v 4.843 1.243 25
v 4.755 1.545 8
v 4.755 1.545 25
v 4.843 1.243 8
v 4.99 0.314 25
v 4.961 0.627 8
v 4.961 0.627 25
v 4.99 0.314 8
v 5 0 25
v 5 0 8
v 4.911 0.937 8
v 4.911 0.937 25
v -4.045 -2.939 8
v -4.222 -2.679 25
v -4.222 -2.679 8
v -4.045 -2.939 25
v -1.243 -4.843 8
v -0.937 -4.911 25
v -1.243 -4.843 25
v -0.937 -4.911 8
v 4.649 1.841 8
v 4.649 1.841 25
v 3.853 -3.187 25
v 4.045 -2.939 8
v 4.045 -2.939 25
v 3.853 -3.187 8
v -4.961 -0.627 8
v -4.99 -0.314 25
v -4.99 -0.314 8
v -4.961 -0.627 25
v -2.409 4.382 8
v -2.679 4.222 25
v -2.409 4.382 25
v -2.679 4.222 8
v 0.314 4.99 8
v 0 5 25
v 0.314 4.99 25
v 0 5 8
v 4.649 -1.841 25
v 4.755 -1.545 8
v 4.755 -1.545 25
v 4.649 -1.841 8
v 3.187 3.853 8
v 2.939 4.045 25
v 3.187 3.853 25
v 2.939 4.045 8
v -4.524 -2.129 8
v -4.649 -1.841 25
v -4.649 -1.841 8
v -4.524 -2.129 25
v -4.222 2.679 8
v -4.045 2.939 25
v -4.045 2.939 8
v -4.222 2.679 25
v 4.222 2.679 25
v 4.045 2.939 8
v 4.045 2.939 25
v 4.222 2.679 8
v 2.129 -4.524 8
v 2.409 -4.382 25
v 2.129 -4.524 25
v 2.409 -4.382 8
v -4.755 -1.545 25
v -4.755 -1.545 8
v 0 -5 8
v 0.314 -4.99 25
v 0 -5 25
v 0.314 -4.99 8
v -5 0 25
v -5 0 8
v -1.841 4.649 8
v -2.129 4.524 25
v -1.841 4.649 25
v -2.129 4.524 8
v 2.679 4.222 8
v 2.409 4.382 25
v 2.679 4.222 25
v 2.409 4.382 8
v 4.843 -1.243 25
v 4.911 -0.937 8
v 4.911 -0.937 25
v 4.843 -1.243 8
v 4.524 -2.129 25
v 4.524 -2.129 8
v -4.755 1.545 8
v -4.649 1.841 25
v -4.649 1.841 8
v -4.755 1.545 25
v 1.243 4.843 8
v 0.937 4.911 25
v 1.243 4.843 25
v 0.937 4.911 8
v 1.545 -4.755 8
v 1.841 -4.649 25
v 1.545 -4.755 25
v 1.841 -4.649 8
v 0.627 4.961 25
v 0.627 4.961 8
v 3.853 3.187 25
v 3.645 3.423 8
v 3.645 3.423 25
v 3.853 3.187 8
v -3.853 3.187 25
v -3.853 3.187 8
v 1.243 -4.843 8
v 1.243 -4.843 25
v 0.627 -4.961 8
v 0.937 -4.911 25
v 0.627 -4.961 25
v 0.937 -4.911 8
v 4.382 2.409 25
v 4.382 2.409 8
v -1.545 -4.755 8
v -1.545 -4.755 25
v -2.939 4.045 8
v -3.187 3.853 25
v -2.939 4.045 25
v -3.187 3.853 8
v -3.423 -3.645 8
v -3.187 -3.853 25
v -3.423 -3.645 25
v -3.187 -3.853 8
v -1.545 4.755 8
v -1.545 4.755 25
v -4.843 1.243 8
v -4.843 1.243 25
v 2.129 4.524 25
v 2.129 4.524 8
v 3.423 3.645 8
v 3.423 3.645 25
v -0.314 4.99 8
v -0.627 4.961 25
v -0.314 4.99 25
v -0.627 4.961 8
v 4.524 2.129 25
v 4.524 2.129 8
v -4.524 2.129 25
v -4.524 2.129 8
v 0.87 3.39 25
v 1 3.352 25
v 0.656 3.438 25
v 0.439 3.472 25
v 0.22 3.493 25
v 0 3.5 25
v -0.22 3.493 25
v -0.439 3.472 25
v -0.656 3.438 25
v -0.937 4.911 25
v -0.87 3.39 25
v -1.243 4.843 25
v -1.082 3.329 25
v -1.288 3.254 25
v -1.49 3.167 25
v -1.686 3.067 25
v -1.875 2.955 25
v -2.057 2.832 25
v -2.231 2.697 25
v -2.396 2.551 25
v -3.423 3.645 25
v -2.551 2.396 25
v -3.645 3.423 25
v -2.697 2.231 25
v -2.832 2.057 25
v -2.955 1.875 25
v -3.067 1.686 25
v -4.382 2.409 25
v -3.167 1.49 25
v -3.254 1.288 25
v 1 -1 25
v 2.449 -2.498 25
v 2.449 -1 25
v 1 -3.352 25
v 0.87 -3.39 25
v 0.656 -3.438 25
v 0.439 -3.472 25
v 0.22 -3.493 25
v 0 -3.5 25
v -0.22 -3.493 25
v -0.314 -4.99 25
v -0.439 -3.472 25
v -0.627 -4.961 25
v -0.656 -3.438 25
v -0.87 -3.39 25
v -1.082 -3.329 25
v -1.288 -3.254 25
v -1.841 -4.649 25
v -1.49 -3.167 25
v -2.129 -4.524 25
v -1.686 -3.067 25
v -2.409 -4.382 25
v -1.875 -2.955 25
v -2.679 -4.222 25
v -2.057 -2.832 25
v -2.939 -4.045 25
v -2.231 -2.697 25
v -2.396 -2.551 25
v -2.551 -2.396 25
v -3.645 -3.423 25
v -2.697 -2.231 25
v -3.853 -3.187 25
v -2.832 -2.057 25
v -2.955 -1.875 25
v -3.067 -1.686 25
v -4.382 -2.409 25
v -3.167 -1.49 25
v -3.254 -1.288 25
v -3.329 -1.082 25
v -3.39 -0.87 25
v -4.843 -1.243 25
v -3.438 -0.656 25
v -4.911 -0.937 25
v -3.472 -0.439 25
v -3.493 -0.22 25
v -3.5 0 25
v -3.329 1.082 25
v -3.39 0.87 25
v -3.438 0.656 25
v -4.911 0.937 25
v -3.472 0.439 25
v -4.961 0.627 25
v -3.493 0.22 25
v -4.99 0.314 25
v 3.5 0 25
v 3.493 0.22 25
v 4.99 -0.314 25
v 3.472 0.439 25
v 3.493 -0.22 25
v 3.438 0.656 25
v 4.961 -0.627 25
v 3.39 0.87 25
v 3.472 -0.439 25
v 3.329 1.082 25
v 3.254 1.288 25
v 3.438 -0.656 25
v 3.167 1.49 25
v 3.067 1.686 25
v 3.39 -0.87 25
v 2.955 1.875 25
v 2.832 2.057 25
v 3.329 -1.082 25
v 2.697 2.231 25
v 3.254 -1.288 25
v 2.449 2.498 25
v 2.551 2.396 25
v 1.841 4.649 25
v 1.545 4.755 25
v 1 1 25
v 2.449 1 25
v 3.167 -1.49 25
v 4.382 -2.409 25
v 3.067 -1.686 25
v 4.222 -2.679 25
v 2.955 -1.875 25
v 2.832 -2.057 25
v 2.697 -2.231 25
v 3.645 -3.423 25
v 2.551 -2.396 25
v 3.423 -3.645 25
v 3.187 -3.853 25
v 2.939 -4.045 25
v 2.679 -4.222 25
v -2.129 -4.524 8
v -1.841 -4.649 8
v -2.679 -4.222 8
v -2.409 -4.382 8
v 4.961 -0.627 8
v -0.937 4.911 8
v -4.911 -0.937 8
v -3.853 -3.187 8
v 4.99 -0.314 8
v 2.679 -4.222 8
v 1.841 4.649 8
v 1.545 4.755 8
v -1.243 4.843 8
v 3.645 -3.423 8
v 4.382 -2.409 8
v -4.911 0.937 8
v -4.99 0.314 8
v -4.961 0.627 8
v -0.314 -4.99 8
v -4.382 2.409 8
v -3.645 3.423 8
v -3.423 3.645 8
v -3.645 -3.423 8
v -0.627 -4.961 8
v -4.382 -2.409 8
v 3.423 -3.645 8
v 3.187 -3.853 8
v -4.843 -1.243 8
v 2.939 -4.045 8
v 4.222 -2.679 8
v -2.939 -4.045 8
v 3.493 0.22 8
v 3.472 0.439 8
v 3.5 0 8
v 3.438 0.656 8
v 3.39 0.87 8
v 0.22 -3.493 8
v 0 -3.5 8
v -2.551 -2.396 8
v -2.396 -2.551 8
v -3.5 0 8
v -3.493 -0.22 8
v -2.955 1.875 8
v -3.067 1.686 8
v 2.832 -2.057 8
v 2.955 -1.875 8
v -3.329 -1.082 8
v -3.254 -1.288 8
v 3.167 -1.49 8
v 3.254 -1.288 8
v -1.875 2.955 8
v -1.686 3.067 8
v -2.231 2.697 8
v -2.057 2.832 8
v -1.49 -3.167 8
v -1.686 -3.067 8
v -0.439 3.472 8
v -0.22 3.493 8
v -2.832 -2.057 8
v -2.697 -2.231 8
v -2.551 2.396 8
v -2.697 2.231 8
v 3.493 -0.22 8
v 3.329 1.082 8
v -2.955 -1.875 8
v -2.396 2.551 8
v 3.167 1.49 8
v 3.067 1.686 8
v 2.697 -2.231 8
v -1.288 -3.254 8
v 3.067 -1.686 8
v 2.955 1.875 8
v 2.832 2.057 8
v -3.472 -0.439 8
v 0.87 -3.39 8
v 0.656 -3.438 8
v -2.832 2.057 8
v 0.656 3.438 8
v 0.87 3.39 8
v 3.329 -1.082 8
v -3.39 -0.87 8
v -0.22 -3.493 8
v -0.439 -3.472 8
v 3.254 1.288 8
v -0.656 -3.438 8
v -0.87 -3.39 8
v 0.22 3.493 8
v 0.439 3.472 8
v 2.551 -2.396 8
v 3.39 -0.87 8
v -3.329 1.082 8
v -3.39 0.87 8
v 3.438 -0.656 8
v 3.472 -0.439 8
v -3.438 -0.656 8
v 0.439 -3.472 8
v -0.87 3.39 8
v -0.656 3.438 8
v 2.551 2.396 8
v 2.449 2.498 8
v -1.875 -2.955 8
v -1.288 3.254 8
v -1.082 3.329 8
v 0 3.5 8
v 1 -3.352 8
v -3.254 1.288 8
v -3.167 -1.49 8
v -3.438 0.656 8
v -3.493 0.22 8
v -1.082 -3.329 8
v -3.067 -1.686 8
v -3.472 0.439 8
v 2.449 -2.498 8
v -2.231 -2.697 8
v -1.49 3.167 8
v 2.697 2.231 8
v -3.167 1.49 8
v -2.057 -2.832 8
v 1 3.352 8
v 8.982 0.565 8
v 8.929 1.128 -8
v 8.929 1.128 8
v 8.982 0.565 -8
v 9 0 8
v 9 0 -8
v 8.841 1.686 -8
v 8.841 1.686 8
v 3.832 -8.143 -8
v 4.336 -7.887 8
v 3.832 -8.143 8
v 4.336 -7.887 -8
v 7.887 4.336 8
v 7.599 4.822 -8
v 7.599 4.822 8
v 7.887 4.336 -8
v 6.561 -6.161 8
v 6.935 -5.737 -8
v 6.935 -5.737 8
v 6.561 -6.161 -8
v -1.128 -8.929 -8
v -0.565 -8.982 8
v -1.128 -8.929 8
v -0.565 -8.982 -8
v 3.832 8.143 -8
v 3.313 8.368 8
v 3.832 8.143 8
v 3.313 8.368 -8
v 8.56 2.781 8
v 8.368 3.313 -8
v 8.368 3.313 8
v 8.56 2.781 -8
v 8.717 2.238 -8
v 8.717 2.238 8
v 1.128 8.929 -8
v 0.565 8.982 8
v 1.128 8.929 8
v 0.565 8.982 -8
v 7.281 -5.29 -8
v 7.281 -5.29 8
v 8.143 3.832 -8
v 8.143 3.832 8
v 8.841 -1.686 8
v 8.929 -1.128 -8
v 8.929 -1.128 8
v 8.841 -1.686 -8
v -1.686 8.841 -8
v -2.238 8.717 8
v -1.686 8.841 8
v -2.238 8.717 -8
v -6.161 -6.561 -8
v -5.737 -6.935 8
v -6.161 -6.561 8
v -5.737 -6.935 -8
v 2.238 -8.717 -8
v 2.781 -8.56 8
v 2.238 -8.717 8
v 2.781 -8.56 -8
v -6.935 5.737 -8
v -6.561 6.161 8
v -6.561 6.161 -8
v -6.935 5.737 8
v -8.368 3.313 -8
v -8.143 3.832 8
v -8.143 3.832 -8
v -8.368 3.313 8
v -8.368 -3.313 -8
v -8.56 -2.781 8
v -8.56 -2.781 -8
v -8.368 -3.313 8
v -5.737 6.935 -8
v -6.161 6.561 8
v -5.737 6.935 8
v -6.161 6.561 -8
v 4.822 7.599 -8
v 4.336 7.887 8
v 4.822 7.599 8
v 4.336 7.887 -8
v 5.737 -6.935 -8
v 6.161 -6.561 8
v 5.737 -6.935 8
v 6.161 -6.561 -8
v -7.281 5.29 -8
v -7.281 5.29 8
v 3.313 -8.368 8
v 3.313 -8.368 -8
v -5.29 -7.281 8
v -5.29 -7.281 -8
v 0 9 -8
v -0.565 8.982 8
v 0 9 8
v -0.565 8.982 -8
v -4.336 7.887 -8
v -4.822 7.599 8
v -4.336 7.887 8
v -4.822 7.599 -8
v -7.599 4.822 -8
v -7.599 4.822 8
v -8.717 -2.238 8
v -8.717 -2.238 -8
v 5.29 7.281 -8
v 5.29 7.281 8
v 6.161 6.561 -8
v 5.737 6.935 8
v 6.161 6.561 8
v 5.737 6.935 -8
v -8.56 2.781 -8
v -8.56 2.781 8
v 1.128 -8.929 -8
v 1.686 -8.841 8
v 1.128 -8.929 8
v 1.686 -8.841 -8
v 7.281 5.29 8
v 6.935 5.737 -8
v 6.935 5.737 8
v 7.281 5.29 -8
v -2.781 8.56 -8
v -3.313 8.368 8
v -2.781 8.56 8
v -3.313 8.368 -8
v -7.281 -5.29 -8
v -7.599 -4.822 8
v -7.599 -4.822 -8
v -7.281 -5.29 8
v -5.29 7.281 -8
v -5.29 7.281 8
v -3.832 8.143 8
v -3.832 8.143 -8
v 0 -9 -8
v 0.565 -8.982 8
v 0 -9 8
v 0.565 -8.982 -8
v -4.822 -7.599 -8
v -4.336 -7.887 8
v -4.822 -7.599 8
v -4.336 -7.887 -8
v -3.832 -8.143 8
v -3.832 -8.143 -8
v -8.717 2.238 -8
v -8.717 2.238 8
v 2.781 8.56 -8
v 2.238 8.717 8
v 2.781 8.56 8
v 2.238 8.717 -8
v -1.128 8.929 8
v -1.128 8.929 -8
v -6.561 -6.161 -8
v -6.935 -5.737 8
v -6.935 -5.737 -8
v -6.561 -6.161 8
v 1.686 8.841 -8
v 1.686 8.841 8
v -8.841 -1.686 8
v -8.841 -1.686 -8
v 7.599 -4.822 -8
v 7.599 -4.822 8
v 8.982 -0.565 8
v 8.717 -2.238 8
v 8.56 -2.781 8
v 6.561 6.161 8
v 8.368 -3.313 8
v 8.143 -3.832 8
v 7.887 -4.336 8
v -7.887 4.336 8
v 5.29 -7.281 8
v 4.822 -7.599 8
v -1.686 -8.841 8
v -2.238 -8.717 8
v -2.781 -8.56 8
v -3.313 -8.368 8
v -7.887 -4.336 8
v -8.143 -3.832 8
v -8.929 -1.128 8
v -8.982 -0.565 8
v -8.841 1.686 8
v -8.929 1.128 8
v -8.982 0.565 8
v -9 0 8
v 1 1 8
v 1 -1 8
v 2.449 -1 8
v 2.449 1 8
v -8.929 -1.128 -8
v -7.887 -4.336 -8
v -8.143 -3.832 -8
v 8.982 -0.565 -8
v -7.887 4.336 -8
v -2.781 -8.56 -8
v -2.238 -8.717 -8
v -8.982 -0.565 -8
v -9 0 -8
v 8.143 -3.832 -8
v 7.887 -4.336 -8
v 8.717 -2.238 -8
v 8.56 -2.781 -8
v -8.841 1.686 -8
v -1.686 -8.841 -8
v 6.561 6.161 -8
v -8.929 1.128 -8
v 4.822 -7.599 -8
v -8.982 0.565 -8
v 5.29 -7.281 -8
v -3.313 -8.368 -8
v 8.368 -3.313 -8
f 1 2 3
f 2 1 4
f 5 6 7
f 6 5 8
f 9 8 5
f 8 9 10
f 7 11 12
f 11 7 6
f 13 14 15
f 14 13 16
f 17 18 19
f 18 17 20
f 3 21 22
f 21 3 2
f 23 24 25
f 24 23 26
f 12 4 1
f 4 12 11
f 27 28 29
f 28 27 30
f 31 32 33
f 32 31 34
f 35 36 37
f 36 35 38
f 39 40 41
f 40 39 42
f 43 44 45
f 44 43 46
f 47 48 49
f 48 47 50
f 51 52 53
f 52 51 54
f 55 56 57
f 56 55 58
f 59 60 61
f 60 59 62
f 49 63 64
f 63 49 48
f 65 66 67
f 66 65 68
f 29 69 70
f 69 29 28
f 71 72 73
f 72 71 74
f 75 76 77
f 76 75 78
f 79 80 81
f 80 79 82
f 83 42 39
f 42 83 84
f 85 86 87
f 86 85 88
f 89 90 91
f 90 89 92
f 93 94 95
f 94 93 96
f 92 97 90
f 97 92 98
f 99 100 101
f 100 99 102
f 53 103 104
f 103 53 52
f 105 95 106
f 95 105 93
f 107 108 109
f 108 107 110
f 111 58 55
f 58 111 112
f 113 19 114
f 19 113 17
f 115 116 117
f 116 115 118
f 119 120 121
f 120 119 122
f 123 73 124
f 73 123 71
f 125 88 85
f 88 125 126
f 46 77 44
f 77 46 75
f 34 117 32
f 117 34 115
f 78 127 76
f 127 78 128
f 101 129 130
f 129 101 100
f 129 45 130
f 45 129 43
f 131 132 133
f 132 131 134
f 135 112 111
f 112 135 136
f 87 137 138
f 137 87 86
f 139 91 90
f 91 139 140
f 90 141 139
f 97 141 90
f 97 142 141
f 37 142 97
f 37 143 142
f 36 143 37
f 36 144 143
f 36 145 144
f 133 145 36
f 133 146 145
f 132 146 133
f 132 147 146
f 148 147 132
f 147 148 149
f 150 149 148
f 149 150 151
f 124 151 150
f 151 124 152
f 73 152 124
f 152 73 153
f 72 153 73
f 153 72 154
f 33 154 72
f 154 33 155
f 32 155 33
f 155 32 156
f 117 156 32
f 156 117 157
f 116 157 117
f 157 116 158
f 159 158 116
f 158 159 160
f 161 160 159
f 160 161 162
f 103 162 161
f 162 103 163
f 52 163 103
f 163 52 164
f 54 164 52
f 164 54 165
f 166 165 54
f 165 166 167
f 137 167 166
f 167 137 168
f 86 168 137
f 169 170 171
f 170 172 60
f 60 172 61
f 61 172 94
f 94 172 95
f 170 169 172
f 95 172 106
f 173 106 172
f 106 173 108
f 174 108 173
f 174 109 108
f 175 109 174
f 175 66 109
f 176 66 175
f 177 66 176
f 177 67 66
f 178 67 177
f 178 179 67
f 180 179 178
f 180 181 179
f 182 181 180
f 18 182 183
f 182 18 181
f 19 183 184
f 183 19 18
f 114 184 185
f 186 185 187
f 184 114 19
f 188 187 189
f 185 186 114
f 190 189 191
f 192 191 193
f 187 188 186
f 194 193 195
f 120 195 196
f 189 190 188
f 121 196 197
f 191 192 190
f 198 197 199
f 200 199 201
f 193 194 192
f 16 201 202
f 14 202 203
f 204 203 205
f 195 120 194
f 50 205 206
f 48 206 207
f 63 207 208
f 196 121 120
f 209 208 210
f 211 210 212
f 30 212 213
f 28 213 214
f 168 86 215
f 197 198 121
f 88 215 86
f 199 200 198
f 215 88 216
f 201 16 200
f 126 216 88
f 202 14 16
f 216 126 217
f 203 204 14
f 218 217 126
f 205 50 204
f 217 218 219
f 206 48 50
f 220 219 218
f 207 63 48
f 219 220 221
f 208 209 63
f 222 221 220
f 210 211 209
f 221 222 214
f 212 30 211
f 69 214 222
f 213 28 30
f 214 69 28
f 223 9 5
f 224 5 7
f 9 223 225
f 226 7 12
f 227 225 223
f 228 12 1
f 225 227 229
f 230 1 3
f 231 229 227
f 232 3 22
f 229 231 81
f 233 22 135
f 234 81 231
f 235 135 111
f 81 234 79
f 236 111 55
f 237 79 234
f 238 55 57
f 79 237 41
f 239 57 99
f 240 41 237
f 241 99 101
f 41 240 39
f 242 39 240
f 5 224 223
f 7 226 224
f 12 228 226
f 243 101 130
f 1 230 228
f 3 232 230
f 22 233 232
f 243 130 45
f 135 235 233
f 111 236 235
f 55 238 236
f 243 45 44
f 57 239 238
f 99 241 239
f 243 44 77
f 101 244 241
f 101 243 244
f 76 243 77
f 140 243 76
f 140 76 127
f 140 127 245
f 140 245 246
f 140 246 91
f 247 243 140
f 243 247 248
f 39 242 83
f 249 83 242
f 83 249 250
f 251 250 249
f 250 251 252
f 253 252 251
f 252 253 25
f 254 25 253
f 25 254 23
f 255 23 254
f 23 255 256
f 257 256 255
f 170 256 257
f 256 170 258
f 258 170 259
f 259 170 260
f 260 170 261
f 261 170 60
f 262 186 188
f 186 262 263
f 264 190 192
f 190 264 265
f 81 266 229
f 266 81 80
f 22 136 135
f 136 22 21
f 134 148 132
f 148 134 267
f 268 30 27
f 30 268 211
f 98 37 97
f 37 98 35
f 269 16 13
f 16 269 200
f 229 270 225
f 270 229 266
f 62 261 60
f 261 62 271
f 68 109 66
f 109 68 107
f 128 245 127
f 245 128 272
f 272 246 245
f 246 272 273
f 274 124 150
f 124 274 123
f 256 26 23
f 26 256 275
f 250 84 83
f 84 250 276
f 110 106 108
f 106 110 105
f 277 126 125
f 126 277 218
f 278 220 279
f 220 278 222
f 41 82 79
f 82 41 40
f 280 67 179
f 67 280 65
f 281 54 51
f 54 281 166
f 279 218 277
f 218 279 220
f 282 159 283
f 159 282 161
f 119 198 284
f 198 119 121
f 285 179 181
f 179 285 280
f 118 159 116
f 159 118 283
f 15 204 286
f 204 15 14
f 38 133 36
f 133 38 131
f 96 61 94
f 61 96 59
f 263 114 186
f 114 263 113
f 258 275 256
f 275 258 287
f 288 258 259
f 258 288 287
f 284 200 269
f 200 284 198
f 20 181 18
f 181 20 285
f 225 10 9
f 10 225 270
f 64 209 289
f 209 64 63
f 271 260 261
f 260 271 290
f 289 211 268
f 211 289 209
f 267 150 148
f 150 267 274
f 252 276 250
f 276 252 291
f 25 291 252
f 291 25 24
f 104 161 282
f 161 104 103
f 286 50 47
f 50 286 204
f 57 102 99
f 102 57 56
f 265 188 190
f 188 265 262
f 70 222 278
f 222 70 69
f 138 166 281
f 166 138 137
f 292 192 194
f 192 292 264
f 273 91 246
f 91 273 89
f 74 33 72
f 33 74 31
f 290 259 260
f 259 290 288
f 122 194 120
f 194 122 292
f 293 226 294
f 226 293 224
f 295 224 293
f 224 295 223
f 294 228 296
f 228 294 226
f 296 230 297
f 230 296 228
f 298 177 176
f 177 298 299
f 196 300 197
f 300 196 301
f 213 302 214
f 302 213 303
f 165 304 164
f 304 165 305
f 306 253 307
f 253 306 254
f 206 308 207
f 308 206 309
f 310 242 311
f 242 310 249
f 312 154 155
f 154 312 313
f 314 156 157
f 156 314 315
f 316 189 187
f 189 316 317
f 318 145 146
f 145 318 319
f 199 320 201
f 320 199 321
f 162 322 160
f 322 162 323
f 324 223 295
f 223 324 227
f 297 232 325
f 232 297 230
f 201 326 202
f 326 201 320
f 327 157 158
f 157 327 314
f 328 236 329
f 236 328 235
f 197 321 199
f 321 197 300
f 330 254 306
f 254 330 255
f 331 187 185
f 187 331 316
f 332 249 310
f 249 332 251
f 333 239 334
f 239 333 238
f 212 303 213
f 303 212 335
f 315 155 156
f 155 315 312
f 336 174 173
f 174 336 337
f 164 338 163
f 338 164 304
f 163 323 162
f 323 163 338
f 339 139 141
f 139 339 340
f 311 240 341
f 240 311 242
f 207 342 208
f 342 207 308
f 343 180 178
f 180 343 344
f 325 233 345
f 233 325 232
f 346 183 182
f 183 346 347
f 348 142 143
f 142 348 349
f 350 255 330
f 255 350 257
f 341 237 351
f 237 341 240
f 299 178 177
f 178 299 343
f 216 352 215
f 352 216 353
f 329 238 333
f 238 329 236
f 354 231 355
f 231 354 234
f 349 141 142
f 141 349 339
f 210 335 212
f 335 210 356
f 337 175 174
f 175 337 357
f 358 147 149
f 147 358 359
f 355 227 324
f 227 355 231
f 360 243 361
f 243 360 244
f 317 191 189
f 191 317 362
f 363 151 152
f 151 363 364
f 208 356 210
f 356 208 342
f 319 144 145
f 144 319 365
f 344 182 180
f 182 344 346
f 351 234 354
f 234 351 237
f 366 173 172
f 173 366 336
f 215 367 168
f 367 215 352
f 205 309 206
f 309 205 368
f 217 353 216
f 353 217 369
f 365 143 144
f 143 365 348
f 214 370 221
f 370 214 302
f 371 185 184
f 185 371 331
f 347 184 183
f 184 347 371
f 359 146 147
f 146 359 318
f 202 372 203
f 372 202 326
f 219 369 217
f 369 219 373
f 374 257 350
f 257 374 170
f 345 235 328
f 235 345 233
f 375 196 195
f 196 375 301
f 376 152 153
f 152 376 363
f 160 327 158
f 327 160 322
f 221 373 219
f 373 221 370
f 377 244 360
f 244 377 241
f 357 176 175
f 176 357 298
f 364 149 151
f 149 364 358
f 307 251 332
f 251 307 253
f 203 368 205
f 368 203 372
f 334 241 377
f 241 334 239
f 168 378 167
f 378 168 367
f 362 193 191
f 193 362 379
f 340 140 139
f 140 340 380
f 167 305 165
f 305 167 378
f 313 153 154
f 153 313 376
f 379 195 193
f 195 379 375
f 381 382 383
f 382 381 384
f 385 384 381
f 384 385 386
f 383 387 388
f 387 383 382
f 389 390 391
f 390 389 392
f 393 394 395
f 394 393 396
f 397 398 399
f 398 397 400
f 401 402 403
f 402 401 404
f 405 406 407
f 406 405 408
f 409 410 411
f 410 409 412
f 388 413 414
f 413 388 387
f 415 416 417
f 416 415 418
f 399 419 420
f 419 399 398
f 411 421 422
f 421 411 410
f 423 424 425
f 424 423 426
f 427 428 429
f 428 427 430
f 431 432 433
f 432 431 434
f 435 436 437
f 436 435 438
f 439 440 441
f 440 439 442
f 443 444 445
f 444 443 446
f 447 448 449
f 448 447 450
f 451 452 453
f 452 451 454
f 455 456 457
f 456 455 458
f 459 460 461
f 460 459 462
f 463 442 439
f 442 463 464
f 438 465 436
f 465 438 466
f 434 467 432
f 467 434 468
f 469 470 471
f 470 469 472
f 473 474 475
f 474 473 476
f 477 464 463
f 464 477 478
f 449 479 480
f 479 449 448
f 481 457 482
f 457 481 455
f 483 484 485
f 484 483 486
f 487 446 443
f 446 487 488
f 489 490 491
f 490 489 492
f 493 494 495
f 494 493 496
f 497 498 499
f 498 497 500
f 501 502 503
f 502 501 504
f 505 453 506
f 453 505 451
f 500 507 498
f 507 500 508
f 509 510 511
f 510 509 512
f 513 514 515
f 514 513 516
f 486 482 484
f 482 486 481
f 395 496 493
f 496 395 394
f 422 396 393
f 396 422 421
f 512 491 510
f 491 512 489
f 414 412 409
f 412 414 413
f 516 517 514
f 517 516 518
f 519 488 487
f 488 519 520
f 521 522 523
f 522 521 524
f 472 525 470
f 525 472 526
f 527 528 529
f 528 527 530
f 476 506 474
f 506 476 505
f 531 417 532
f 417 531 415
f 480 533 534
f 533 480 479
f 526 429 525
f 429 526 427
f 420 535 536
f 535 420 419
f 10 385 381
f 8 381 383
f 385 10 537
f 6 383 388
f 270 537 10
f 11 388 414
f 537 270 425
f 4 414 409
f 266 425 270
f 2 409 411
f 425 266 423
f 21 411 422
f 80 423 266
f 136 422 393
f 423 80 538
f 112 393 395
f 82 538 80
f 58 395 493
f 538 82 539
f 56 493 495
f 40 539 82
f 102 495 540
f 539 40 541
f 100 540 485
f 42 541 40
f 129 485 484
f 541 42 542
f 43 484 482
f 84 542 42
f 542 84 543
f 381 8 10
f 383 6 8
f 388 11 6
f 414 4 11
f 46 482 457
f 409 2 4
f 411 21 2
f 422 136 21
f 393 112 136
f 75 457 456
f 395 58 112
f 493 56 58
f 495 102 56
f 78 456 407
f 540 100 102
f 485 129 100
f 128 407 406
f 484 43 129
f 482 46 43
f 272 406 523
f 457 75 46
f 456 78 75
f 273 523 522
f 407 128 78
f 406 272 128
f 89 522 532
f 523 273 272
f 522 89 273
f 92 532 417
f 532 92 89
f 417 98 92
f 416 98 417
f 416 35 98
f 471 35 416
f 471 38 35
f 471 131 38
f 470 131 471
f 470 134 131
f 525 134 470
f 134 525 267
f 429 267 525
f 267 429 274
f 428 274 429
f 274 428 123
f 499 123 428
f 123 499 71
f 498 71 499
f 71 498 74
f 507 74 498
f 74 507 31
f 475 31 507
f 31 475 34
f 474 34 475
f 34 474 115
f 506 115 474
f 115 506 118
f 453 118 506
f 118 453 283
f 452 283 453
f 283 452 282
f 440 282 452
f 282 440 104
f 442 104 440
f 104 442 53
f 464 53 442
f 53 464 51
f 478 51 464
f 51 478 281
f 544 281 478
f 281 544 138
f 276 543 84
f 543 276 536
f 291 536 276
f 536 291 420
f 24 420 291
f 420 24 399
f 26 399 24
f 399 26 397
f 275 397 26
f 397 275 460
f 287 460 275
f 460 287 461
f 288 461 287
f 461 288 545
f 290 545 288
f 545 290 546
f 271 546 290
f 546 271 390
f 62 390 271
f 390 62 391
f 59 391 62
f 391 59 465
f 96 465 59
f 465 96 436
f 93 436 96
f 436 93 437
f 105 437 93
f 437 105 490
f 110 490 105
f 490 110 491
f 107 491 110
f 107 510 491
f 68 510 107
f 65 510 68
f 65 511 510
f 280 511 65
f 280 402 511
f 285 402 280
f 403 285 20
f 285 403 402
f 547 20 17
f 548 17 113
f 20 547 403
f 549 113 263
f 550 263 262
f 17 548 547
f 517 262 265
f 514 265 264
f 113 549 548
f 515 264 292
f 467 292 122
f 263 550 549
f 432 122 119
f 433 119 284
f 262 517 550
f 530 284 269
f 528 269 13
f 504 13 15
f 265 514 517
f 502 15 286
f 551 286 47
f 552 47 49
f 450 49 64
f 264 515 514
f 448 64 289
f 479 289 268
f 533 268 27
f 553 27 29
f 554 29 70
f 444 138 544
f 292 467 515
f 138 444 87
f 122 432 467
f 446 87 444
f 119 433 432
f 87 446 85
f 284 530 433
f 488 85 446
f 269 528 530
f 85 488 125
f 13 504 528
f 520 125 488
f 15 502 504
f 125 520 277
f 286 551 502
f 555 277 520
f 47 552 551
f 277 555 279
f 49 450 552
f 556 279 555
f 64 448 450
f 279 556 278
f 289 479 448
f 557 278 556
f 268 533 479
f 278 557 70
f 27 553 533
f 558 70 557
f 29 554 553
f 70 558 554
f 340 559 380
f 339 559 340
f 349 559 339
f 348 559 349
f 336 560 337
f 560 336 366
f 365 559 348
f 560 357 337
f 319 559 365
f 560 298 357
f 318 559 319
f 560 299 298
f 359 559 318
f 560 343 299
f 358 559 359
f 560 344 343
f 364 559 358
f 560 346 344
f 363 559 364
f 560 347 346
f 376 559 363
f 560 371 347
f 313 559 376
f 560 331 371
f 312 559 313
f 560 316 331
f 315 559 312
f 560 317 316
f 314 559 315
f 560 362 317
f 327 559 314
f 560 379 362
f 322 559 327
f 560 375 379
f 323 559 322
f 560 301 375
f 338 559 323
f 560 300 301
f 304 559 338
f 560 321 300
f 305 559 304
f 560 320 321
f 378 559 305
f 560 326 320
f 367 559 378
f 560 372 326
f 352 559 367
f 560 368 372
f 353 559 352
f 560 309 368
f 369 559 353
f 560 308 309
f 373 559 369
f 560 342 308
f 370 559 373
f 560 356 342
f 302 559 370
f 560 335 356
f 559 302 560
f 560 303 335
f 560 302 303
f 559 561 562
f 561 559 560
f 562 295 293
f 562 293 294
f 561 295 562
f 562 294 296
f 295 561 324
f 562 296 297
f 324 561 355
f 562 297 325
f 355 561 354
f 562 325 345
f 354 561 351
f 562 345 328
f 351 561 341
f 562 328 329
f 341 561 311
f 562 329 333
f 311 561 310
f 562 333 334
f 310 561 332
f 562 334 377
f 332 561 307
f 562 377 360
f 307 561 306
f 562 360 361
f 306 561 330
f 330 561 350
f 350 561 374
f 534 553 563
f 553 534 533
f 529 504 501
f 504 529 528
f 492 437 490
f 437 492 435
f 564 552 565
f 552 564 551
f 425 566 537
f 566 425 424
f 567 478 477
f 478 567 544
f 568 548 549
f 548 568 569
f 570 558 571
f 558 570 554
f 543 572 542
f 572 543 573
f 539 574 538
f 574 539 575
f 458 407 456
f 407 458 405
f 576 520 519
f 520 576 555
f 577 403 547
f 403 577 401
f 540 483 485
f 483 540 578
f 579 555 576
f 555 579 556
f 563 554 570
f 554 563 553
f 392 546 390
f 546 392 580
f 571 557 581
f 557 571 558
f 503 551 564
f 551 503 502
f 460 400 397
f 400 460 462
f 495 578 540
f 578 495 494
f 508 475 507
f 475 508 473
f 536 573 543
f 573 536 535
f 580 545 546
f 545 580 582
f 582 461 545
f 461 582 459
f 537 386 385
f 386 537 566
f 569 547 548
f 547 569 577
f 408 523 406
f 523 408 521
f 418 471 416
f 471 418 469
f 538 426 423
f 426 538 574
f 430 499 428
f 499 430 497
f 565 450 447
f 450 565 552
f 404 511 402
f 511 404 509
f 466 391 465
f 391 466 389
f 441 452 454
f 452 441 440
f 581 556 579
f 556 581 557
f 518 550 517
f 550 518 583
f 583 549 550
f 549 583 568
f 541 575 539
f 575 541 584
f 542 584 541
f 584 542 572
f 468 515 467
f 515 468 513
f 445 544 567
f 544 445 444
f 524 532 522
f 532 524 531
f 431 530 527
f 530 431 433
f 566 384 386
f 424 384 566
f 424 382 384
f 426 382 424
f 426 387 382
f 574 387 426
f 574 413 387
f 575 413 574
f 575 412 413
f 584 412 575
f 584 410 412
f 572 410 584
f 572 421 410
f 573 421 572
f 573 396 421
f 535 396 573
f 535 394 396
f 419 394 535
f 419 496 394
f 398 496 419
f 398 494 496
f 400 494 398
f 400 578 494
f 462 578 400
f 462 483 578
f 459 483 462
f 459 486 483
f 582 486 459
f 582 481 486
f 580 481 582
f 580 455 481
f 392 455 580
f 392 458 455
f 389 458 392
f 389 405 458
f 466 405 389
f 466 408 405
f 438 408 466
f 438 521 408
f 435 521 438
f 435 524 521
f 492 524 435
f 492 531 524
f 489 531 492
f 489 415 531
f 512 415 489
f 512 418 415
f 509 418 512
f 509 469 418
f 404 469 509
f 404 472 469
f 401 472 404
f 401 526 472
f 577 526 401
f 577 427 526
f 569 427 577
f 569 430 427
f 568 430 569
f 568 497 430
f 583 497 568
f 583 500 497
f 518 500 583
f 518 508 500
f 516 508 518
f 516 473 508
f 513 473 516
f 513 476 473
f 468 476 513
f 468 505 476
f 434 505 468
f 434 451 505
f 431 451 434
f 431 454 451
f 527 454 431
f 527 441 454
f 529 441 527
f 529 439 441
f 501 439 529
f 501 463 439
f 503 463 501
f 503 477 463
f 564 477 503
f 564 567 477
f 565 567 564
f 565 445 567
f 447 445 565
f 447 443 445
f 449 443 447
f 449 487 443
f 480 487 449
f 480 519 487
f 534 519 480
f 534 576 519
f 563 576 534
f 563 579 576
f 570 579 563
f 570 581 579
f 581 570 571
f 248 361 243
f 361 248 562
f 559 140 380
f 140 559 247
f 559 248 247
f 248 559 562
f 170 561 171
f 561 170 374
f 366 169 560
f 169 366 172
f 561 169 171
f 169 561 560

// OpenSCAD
// [FL_INDEX: keywords="openscad, 3d_parametric, Knob_with_D-shaft, csg_solid" | COT="Parametric OpenSCAD design from 3DCodeverse"]
// Title: Knob with D-shaft

//design and code by bioprint (http://www.thingiverse.com/bioprint)
//This code generates a knob with a D-shaft (customizable)
// 2013-12-07:	first design



// Top diameter
TopDiameter=18;
// Top height
TopHeight = 16; // [16]
// Shaft length
ShaftLength=18;
// Shaft outer diameter
ShaftOuterDiameter=10;
// Shaft inner diameter
ShaftInnerDiameter=7;
// Shaft pin width
ShaftPinWidth=2;
// XOffset
XOffset =1;



cylinder (h = TopHeight, r=TopDiameter/2, center = true, $fn=100);


difference() {
    			translate([0, 0, TopHeight])
    				cylinder (h = ShaftLength, r=ShaftOuterDiameter/2, center = true, $fn=100);
			translate([0, 0, TopHeight])
				cylinder (h = ShaftLength, r=ShaftInnerDiameter/2, center = true, $fn=100);
}

// add pins
PinHolderY=ShaftInnerDiameter/2-ShaftPinWidth/2;
PinholderX=sqrt(ShaftInnerDiameter*ShaftInnerDiameter/4-PinHolderY*PinHolderY)-XOffset;

translate([PinholderX/2+XOffset, PinHolderY/2+ShaftPinWidth/2, TopHeight]) 
	cube(size = [PinholderX,PinHolderY,ShaftLength], center = true);

translate([PinholderX/2+XOffset, 0-PinHolderY/2-ShaftPinWidth/2, TopHeight]) 
	cube(size = [PinholderX,PinHolderY,ShaftLength], center = true);
